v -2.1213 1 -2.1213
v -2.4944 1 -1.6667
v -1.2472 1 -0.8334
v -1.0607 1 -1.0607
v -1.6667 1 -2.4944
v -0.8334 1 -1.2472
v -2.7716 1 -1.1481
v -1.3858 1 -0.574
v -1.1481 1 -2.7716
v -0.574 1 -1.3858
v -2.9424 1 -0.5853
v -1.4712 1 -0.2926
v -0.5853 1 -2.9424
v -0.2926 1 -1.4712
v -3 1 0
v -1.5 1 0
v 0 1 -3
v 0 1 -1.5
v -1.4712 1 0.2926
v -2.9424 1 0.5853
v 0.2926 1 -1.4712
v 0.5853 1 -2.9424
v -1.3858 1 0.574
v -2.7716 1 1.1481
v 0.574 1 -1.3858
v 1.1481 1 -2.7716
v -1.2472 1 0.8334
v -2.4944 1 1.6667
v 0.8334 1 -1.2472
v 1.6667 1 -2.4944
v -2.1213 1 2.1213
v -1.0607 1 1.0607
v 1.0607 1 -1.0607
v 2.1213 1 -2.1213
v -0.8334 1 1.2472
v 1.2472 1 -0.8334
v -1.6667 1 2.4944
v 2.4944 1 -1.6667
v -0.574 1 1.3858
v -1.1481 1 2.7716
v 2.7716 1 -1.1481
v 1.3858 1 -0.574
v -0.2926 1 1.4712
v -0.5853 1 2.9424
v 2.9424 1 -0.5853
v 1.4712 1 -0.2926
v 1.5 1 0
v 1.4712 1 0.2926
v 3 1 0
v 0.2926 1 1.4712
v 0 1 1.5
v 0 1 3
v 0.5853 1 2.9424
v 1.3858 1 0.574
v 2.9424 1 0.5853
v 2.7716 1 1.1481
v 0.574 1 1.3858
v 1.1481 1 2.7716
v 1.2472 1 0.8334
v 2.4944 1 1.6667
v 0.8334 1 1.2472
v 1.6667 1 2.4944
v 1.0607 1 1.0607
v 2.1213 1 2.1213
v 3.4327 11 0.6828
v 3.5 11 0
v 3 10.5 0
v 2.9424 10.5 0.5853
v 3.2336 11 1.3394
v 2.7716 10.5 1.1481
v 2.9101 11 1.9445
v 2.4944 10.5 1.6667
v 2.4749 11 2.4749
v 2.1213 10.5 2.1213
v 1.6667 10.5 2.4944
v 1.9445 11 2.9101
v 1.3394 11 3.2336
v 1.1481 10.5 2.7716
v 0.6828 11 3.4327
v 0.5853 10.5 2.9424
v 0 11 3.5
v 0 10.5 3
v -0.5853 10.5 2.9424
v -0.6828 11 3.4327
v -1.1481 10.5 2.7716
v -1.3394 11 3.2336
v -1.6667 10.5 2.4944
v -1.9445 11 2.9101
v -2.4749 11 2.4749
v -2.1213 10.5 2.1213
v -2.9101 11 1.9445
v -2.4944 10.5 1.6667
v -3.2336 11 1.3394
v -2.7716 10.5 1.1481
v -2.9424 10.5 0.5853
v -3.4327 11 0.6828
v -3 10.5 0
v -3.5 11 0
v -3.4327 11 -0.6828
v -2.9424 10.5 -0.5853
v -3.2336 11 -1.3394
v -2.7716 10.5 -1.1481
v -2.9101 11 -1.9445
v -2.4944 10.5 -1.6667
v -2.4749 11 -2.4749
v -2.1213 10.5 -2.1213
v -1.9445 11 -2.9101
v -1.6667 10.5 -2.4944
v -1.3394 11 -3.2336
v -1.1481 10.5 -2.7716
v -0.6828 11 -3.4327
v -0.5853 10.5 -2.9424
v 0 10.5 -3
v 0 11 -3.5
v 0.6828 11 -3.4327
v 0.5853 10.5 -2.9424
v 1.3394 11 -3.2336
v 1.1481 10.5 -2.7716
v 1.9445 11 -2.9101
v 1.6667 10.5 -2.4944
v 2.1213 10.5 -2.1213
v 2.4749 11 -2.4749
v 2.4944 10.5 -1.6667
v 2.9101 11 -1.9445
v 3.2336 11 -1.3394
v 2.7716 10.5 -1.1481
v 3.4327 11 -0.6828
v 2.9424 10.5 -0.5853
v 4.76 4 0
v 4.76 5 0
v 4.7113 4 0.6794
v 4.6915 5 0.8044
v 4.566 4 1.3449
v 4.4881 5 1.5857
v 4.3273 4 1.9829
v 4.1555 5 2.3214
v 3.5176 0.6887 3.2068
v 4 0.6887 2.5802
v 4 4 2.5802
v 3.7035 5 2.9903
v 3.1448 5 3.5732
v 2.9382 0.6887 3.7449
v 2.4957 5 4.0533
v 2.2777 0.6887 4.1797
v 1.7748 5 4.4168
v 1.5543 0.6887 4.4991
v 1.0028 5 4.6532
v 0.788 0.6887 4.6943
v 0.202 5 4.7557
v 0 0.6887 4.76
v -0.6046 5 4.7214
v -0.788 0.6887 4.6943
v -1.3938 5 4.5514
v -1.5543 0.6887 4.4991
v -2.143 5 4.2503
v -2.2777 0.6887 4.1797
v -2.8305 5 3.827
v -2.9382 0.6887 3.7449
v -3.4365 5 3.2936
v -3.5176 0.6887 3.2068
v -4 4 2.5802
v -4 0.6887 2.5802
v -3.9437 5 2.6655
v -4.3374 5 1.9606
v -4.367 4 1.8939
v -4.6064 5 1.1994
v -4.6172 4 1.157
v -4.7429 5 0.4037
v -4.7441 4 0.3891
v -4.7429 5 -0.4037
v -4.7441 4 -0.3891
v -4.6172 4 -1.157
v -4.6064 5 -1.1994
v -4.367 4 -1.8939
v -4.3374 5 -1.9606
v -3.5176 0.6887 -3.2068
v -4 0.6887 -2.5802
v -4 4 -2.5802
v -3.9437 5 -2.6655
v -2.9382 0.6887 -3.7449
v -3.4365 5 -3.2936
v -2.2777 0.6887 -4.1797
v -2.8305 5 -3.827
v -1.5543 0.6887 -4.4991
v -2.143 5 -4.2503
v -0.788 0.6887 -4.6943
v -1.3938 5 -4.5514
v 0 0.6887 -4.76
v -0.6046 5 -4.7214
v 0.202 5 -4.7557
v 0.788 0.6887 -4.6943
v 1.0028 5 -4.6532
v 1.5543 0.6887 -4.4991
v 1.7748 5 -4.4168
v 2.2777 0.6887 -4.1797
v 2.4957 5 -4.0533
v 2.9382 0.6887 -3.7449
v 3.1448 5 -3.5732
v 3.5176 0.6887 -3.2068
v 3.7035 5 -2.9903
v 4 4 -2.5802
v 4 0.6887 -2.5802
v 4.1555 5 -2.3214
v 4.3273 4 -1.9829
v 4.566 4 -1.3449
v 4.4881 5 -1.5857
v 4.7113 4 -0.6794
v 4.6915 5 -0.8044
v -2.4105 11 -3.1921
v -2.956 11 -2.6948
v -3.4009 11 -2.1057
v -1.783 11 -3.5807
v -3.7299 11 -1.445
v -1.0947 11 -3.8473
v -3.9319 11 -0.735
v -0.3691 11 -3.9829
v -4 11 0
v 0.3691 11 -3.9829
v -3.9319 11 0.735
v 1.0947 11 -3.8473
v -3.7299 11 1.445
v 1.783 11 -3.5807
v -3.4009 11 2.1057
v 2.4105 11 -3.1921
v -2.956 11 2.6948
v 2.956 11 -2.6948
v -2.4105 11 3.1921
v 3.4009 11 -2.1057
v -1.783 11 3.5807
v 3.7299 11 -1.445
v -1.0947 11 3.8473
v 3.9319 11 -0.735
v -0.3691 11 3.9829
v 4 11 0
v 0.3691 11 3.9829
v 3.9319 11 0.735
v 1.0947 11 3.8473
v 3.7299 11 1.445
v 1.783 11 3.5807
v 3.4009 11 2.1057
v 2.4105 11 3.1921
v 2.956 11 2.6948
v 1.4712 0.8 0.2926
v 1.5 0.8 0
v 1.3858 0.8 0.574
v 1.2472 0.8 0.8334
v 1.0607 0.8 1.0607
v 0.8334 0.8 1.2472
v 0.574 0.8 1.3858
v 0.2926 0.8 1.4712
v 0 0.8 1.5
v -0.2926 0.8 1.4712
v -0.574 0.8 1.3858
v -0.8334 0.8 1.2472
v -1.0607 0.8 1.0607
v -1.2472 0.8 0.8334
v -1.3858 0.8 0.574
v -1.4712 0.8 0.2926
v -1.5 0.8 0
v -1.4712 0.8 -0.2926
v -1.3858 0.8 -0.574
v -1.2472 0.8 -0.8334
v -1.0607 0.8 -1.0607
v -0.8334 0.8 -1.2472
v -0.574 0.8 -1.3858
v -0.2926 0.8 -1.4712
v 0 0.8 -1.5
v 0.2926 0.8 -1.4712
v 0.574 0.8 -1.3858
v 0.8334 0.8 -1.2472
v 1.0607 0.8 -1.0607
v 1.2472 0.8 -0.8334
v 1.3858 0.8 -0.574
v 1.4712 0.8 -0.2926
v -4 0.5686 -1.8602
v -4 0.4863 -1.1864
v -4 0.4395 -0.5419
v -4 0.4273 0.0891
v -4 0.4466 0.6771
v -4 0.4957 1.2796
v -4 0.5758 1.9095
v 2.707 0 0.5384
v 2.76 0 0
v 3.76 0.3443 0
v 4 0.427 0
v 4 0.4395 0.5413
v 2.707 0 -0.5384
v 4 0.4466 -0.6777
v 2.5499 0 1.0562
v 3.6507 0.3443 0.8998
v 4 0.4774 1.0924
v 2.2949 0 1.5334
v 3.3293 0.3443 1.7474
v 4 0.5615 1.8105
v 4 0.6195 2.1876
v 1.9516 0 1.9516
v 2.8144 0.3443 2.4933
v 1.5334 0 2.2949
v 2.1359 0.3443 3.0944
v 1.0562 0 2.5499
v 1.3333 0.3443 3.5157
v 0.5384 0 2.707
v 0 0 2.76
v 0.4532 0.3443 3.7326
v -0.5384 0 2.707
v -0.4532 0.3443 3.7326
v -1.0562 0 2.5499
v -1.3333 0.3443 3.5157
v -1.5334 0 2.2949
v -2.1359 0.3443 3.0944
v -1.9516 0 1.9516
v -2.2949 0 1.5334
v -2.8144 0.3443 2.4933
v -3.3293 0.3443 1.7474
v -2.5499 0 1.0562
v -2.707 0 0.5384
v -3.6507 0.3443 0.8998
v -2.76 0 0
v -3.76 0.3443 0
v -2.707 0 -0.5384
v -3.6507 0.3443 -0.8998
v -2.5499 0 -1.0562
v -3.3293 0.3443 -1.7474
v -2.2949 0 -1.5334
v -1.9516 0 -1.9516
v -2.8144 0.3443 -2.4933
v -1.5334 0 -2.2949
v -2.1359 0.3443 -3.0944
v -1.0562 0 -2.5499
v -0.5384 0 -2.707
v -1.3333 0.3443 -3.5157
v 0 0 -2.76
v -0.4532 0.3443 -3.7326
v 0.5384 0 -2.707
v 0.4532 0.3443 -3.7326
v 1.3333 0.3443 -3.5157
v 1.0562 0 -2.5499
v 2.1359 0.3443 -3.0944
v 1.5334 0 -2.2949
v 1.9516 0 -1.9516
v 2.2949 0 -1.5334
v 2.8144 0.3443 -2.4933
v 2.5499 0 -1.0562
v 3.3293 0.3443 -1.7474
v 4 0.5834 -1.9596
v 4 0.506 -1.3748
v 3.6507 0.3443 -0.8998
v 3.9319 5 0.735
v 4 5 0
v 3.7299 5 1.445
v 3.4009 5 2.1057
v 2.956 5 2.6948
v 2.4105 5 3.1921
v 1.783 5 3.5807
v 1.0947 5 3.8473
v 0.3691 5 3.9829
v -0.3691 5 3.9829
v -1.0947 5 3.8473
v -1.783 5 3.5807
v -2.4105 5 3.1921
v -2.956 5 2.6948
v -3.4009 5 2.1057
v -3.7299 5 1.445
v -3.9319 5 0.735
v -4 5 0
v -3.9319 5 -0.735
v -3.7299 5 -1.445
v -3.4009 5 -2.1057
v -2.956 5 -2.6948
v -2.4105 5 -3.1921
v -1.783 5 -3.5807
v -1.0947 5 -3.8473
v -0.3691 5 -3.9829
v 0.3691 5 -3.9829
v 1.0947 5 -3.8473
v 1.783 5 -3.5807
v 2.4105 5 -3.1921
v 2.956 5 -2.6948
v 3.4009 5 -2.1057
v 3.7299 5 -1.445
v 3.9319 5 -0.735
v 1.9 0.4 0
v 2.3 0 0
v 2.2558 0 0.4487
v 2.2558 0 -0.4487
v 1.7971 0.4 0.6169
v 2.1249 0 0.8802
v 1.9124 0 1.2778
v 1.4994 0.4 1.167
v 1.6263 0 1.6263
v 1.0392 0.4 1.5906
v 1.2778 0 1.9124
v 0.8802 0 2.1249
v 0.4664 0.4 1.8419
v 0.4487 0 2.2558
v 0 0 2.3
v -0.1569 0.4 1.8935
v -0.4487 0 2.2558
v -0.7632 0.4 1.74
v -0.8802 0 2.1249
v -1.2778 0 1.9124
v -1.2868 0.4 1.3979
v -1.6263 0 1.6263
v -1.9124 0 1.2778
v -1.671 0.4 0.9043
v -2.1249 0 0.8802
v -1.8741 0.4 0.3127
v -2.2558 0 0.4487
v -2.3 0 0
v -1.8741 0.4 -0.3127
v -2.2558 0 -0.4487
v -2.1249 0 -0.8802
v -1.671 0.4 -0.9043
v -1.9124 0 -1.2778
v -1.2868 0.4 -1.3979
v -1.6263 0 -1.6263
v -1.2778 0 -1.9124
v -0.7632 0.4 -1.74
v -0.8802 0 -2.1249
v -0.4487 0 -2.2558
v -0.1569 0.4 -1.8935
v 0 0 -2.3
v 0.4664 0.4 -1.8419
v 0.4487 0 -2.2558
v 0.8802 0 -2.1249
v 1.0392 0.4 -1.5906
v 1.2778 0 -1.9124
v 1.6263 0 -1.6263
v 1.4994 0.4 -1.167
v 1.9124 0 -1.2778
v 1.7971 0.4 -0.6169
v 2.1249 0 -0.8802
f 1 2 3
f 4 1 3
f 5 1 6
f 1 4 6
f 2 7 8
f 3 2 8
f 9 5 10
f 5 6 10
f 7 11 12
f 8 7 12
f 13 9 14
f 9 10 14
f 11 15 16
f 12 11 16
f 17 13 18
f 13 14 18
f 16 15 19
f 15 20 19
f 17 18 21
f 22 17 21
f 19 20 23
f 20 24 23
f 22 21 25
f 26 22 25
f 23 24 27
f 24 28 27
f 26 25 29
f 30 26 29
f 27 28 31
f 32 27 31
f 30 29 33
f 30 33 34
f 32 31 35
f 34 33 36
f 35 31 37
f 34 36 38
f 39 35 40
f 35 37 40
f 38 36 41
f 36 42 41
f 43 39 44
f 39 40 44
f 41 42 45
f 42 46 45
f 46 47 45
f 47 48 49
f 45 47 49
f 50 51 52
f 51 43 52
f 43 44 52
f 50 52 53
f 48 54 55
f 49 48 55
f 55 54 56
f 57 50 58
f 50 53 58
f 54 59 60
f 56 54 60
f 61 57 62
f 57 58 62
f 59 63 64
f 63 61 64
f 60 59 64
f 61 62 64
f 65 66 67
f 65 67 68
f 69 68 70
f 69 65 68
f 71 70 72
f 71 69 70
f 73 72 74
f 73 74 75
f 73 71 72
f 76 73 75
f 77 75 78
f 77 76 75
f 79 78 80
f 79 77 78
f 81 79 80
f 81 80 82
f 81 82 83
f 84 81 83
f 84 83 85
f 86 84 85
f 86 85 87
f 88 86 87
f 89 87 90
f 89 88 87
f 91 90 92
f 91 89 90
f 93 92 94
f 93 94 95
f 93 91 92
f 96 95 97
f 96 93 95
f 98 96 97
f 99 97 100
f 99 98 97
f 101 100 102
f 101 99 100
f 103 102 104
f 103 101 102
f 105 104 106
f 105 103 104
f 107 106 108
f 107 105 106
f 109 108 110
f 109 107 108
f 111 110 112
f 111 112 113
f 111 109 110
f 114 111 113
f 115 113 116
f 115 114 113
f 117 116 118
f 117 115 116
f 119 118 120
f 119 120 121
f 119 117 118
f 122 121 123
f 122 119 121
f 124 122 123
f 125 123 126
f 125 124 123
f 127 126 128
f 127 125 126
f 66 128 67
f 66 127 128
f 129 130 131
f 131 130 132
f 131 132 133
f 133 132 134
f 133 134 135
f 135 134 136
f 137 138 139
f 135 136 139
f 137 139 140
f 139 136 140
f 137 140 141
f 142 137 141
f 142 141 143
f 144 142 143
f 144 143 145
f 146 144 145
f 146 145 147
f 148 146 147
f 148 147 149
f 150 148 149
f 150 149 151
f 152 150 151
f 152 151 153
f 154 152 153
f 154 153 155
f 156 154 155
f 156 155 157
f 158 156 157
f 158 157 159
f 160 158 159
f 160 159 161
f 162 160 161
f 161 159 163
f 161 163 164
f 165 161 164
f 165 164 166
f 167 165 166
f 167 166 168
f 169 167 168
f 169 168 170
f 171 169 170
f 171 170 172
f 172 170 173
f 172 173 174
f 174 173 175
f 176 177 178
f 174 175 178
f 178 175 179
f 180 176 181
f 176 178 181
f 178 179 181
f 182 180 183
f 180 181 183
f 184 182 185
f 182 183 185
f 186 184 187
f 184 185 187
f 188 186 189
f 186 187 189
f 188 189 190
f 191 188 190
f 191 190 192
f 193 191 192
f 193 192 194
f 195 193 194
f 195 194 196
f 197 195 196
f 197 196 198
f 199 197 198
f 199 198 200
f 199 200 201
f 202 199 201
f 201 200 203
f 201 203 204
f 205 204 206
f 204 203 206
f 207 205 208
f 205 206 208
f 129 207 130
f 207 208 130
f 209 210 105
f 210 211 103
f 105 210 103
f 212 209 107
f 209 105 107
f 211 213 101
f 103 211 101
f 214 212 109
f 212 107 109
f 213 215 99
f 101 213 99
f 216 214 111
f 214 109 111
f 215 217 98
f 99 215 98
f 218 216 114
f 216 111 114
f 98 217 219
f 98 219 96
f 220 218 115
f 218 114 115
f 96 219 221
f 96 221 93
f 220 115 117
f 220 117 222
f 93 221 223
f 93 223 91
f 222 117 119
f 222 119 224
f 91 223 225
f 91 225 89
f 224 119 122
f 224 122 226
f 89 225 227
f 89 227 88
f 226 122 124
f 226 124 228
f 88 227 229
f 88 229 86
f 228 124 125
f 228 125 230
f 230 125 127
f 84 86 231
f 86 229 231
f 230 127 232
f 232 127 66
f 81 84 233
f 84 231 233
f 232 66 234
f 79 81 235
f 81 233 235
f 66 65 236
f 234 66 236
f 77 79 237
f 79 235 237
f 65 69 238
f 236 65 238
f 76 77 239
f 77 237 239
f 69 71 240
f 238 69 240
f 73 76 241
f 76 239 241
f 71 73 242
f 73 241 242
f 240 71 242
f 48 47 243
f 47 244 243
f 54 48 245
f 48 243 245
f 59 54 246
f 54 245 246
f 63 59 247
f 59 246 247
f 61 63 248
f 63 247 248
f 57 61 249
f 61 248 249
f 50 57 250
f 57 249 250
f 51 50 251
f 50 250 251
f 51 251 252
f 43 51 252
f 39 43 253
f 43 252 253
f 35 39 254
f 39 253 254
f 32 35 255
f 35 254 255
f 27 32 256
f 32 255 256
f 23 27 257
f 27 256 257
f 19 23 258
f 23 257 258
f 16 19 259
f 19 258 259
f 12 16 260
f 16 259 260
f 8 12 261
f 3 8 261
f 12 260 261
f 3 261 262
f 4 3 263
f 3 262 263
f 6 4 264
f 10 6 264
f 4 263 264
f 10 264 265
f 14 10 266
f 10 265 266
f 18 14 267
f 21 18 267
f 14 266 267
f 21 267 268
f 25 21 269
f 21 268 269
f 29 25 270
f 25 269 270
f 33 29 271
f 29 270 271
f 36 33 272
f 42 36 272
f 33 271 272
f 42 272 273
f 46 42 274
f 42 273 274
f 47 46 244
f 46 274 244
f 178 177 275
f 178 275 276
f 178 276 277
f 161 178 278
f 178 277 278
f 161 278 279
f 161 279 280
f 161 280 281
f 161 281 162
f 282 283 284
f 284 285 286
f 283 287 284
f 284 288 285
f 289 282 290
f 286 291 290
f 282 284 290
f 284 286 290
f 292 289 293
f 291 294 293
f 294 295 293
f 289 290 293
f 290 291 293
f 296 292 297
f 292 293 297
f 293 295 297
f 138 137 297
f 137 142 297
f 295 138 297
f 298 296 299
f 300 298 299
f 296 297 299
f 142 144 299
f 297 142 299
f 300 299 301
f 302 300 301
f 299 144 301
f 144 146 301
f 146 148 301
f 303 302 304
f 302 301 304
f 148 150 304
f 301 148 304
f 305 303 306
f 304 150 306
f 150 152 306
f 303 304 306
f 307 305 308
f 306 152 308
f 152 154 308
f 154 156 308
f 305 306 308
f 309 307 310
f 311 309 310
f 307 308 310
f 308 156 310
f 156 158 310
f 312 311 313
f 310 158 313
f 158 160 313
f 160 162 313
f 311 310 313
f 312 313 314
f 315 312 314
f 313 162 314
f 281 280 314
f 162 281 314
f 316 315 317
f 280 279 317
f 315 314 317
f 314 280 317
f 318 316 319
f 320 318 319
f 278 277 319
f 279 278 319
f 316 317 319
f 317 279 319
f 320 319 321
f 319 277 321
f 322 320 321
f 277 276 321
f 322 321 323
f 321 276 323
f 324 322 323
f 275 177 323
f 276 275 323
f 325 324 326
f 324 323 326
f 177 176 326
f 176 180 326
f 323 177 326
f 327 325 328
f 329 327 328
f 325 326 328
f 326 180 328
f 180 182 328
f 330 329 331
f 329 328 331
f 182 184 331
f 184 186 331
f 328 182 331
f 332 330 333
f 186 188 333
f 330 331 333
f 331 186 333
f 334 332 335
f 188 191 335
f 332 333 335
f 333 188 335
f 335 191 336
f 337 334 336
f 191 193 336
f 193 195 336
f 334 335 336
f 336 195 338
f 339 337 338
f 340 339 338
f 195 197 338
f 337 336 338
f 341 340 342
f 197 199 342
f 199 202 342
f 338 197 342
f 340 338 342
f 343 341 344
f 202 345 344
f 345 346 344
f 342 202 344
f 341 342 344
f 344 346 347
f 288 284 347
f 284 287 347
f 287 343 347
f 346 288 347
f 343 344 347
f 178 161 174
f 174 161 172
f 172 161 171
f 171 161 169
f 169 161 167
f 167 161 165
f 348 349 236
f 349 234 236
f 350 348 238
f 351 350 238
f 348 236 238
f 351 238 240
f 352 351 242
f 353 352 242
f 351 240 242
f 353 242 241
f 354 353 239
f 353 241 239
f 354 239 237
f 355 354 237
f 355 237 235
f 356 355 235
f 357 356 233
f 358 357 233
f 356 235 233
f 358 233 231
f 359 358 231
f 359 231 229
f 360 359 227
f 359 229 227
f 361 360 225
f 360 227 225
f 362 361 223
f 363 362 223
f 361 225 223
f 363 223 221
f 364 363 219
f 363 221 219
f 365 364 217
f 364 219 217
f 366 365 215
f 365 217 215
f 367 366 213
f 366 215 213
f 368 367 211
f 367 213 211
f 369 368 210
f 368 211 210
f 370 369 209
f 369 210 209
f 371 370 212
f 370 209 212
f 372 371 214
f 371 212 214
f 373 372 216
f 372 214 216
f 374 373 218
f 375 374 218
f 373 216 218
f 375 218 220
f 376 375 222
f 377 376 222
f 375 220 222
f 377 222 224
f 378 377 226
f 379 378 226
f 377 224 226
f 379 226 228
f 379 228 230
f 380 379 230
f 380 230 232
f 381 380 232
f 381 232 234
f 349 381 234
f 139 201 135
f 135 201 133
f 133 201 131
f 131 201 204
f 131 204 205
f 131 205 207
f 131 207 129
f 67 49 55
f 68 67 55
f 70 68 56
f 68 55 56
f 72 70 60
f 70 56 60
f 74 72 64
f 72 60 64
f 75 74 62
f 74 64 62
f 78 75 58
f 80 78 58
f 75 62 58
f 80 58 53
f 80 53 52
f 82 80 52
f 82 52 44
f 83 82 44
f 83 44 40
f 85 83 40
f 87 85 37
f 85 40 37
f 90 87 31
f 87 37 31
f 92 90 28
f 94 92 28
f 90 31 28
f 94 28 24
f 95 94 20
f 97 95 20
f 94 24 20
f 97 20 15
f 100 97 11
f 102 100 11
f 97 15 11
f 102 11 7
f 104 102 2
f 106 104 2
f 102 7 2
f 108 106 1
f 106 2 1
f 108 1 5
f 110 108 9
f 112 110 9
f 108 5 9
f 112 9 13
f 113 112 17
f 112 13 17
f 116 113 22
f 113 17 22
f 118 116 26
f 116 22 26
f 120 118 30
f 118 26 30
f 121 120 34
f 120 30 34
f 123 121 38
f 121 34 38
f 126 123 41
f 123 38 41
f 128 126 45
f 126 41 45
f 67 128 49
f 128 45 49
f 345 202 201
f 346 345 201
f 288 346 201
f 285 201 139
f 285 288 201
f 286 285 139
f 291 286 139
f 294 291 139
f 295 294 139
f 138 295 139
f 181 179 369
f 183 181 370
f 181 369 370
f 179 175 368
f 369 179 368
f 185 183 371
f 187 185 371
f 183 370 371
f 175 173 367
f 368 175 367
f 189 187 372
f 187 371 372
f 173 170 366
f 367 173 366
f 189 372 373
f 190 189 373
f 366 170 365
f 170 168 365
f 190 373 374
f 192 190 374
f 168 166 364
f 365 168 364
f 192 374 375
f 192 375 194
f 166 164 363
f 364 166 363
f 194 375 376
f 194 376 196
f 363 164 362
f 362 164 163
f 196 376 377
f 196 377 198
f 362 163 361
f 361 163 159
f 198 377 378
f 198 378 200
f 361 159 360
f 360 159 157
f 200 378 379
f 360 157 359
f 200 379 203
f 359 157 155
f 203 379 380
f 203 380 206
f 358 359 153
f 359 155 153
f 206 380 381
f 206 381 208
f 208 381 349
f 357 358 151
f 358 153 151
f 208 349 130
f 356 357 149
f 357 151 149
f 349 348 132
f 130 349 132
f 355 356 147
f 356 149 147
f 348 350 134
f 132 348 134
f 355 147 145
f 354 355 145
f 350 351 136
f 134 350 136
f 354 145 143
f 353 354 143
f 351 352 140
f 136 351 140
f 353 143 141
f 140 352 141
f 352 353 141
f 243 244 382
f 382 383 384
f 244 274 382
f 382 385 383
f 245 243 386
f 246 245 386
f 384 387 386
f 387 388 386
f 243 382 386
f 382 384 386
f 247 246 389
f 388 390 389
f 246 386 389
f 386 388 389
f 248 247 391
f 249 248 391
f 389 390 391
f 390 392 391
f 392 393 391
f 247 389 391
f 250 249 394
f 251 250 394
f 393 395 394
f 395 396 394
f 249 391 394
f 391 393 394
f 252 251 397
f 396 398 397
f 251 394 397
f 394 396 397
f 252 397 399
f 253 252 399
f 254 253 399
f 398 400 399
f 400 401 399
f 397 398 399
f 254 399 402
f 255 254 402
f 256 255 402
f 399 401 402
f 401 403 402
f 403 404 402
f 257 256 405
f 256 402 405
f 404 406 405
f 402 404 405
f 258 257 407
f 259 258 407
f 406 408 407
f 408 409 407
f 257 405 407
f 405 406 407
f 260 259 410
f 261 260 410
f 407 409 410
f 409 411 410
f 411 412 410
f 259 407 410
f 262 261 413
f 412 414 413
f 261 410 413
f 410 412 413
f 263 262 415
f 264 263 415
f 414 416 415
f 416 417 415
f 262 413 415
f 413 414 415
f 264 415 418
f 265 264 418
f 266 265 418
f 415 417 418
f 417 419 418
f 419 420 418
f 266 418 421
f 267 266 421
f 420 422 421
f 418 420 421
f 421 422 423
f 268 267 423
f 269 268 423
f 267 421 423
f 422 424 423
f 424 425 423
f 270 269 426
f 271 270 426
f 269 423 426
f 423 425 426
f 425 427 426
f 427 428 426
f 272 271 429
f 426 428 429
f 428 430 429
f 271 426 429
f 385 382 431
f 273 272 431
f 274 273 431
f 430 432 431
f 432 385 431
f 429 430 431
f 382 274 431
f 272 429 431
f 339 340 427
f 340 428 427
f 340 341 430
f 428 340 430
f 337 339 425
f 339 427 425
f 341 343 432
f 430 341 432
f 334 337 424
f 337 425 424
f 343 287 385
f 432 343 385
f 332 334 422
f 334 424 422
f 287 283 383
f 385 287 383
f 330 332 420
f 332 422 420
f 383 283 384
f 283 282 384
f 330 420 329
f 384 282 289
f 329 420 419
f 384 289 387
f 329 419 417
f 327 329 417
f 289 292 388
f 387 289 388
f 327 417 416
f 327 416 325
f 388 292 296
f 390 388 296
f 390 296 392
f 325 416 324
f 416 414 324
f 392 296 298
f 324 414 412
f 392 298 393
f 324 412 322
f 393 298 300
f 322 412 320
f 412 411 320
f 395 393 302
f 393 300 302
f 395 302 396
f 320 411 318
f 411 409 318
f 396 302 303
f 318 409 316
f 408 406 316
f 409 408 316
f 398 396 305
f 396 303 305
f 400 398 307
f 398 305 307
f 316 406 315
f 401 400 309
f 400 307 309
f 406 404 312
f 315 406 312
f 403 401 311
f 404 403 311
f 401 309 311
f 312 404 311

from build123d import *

# Parameters (mm, degrees)
CHAFL_N1_SIZE         = 2
CHAFL_N1_SIZE2        = 0.688655227
CHAFL_N2_SIZE         = 0.5
CROQUIS2_OUTSIDE_W    = 14.998
CROQUIS2_OUTSIDE_H    = 14.998
CROQUIS2_OUTSIDE_W_2  = 8
CROQUIS2_OUTSIDE_H_2  = 12
CORTAR_EXTRUIR1_DEPTH = 4


with BuildPart() as part:
    # Croquis1 → Revolución2 (revolve)
    with BuildSketch(Plane.XY):
        Polygon((2.3, 0), (4.76, 0), (4.76, 5), (4, 5), (4, 11), (3, 11), (3, 1), (1.5, 1), (1.5, 0.8), align=None)
    revolve(axis=Axis((0, 26.23655914, 0), (0, -1, 0)))

    # Chaflán1
    chafl_n1_edges = [part.edges().sort_by_distance(p)[0] for p in [
        (-4.76, 0, 0),
    ]]
    chafl_n1_side = [part.faces().sort_by_distance(p)[0] for p in [
        (-2.434633131, 0, 0),
    ]]
    chamfer(chafl_n1_edges, length=CHAFL_N1_SIZE, length2=CHAFL_N1_SIZE2, reference=chafl_n1_side[0])

    # Chaflán2
    chafl_n2_edges = [part.edges().sort_by_distance(p)[0] for p in [
        (-3, 11, 0),
    ]]
    chamfer(chafl_n2_edges, length=CHAFL_N2_SIZE)

    # Croquis2 outside → Cortar-Extruir1 (cut)
    with BuildSketch(Plane.XZ):
        Rectangle(CROQUIS2_OUTSIDE_W, CROQUIS2_OUTSIDE_H)
        Rectangle(CROQUIS2_OUTSIDE_W_2, CROQUIS2_OUTSIDE_H_2, mode=Mode.SUBTRACT)
    extrude(amount=-CORTAR_EXTRUIR1_DEPTH, mode=Mode.SUBTRACT)


solid = part.part
